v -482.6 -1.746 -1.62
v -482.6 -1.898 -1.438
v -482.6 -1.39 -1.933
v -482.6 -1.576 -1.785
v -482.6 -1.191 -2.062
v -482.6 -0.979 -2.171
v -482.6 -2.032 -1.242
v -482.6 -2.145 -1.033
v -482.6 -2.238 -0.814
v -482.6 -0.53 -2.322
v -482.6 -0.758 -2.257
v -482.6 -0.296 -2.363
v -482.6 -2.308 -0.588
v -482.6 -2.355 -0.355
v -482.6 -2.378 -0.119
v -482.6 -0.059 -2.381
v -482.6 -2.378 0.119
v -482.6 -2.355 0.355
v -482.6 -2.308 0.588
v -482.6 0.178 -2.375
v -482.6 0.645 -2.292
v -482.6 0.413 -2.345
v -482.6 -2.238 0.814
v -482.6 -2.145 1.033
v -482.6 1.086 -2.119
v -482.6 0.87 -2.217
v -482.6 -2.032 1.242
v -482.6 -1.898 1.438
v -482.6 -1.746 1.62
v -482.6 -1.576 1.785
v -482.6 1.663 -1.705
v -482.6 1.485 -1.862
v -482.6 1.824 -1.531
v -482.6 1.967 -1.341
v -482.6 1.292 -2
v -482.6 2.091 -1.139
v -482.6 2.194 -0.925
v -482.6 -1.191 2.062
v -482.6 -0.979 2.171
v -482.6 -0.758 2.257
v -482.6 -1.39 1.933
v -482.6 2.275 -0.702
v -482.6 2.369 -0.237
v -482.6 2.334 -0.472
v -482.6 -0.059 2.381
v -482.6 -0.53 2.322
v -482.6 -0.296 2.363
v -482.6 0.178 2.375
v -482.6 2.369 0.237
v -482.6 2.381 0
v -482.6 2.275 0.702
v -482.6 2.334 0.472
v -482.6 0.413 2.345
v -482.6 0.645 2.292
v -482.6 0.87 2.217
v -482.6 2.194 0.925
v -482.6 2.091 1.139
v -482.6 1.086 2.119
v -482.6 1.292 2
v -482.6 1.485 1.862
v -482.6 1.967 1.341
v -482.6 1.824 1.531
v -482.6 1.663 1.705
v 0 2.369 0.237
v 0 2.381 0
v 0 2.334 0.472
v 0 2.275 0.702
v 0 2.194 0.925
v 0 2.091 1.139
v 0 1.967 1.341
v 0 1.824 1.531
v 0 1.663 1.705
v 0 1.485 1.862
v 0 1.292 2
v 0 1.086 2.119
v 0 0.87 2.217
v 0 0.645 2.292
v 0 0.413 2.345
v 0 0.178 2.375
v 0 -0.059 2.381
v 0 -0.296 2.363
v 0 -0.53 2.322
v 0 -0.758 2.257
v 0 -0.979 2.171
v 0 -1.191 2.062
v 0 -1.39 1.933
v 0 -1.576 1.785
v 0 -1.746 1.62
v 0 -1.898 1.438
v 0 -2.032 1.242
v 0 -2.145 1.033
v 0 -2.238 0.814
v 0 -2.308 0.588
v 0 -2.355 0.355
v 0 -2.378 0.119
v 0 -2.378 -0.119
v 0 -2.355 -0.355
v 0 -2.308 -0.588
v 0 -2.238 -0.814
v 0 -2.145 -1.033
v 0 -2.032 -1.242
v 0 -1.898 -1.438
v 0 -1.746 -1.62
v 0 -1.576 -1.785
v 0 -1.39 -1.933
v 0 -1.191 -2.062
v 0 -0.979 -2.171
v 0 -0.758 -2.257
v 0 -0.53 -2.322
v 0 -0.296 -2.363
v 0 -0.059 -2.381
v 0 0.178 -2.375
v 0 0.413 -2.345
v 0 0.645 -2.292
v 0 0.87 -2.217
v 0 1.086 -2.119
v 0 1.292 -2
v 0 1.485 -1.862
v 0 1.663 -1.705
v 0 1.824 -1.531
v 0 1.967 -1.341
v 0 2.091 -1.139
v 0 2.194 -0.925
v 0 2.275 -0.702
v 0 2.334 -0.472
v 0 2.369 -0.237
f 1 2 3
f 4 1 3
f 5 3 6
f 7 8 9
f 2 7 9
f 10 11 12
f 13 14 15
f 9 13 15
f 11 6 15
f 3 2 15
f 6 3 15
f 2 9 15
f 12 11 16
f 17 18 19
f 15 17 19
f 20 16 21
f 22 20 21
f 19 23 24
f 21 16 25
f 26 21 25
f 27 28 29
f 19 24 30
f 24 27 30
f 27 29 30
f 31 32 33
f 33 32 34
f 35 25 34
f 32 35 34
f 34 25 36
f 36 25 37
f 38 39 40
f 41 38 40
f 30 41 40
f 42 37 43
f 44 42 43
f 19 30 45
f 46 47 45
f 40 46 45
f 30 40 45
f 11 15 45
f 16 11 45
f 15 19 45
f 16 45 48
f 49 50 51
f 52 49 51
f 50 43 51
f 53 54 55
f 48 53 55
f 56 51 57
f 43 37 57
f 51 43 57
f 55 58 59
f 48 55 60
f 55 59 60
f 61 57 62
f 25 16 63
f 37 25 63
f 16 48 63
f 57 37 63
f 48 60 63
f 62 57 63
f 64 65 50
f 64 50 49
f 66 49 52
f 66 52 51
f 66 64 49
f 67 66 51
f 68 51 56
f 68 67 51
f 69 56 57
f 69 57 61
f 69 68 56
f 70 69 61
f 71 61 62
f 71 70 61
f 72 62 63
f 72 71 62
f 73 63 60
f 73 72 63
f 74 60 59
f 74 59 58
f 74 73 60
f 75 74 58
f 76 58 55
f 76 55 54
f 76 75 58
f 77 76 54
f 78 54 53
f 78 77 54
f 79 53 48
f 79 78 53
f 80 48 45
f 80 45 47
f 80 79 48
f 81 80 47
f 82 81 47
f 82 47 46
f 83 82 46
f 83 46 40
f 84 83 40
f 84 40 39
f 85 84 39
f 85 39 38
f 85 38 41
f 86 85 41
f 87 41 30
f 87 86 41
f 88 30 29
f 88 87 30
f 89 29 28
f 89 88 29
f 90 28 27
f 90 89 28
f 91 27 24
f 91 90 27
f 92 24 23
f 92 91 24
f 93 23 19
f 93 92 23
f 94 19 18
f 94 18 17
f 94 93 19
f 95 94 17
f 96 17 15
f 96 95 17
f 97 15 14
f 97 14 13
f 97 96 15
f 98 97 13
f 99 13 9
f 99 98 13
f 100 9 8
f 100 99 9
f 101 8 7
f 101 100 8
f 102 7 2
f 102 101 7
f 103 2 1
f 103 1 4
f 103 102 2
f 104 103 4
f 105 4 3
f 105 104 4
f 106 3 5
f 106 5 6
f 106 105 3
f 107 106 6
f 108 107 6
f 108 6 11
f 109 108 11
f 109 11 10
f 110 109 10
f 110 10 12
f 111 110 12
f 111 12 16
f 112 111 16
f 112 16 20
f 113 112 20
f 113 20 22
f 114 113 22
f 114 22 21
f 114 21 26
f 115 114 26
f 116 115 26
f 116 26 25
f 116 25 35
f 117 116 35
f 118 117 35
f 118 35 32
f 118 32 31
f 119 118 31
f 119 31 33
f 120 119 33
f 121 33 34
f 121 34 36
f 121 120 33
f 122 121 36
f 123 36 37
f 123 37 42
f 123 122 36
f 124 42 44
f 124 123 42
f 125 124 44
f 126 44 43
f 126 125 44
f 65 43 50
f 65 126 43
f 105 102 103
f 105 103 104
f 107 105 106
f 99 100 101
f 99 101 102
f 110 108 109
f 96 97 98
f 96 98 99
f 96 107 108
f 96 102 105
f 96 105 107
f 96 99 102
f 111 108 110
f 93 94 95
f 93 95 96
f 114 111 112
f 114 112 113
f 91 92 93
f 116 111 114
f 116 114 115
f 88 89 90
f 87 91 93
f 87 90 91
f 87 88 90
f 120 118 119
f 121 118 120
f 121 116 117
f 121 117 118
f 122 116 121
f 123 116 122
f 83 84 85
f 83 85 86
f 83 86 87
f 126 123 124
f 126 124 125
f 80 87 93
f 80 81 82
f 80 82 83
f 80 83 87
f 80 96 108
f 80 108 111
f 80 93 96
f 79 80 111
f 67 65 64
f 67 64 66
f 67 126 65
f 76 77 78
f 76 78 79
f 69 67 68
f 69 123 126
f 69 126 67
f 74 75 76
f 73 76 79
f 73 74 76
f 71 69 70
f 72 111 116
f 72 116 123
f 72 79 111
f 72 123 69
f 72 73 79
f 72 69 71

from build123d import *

# Parameters (mm, degrees)
F0_R     = 2.38125
F1_DEPTH = 482.6
F2_R     = 6.096
F2_R_2   = 1.5875
F3_DEPTH = 3.175


with BuildPart() as f1:
    # F0 (on Right) → F1 (new body)
    with BuildSketch(Plane.YZ):
        Circle(F0_R)
    extrude(amount=-F1_DEPTH)


with BuildPart() as f3:
    # F2 (on Right) → F3 (new body)
    with BuildSketch(Plane.YZ):
        with Locations((-50.084271, 0)):
            Circle(F2_R)
        with Locations((-50.084271, 0)):
            Circle(F2_R_2, mode=Mode.SUBTRACT)
    extrude(amount=-F3_DEPTH)


solid = f1.part
